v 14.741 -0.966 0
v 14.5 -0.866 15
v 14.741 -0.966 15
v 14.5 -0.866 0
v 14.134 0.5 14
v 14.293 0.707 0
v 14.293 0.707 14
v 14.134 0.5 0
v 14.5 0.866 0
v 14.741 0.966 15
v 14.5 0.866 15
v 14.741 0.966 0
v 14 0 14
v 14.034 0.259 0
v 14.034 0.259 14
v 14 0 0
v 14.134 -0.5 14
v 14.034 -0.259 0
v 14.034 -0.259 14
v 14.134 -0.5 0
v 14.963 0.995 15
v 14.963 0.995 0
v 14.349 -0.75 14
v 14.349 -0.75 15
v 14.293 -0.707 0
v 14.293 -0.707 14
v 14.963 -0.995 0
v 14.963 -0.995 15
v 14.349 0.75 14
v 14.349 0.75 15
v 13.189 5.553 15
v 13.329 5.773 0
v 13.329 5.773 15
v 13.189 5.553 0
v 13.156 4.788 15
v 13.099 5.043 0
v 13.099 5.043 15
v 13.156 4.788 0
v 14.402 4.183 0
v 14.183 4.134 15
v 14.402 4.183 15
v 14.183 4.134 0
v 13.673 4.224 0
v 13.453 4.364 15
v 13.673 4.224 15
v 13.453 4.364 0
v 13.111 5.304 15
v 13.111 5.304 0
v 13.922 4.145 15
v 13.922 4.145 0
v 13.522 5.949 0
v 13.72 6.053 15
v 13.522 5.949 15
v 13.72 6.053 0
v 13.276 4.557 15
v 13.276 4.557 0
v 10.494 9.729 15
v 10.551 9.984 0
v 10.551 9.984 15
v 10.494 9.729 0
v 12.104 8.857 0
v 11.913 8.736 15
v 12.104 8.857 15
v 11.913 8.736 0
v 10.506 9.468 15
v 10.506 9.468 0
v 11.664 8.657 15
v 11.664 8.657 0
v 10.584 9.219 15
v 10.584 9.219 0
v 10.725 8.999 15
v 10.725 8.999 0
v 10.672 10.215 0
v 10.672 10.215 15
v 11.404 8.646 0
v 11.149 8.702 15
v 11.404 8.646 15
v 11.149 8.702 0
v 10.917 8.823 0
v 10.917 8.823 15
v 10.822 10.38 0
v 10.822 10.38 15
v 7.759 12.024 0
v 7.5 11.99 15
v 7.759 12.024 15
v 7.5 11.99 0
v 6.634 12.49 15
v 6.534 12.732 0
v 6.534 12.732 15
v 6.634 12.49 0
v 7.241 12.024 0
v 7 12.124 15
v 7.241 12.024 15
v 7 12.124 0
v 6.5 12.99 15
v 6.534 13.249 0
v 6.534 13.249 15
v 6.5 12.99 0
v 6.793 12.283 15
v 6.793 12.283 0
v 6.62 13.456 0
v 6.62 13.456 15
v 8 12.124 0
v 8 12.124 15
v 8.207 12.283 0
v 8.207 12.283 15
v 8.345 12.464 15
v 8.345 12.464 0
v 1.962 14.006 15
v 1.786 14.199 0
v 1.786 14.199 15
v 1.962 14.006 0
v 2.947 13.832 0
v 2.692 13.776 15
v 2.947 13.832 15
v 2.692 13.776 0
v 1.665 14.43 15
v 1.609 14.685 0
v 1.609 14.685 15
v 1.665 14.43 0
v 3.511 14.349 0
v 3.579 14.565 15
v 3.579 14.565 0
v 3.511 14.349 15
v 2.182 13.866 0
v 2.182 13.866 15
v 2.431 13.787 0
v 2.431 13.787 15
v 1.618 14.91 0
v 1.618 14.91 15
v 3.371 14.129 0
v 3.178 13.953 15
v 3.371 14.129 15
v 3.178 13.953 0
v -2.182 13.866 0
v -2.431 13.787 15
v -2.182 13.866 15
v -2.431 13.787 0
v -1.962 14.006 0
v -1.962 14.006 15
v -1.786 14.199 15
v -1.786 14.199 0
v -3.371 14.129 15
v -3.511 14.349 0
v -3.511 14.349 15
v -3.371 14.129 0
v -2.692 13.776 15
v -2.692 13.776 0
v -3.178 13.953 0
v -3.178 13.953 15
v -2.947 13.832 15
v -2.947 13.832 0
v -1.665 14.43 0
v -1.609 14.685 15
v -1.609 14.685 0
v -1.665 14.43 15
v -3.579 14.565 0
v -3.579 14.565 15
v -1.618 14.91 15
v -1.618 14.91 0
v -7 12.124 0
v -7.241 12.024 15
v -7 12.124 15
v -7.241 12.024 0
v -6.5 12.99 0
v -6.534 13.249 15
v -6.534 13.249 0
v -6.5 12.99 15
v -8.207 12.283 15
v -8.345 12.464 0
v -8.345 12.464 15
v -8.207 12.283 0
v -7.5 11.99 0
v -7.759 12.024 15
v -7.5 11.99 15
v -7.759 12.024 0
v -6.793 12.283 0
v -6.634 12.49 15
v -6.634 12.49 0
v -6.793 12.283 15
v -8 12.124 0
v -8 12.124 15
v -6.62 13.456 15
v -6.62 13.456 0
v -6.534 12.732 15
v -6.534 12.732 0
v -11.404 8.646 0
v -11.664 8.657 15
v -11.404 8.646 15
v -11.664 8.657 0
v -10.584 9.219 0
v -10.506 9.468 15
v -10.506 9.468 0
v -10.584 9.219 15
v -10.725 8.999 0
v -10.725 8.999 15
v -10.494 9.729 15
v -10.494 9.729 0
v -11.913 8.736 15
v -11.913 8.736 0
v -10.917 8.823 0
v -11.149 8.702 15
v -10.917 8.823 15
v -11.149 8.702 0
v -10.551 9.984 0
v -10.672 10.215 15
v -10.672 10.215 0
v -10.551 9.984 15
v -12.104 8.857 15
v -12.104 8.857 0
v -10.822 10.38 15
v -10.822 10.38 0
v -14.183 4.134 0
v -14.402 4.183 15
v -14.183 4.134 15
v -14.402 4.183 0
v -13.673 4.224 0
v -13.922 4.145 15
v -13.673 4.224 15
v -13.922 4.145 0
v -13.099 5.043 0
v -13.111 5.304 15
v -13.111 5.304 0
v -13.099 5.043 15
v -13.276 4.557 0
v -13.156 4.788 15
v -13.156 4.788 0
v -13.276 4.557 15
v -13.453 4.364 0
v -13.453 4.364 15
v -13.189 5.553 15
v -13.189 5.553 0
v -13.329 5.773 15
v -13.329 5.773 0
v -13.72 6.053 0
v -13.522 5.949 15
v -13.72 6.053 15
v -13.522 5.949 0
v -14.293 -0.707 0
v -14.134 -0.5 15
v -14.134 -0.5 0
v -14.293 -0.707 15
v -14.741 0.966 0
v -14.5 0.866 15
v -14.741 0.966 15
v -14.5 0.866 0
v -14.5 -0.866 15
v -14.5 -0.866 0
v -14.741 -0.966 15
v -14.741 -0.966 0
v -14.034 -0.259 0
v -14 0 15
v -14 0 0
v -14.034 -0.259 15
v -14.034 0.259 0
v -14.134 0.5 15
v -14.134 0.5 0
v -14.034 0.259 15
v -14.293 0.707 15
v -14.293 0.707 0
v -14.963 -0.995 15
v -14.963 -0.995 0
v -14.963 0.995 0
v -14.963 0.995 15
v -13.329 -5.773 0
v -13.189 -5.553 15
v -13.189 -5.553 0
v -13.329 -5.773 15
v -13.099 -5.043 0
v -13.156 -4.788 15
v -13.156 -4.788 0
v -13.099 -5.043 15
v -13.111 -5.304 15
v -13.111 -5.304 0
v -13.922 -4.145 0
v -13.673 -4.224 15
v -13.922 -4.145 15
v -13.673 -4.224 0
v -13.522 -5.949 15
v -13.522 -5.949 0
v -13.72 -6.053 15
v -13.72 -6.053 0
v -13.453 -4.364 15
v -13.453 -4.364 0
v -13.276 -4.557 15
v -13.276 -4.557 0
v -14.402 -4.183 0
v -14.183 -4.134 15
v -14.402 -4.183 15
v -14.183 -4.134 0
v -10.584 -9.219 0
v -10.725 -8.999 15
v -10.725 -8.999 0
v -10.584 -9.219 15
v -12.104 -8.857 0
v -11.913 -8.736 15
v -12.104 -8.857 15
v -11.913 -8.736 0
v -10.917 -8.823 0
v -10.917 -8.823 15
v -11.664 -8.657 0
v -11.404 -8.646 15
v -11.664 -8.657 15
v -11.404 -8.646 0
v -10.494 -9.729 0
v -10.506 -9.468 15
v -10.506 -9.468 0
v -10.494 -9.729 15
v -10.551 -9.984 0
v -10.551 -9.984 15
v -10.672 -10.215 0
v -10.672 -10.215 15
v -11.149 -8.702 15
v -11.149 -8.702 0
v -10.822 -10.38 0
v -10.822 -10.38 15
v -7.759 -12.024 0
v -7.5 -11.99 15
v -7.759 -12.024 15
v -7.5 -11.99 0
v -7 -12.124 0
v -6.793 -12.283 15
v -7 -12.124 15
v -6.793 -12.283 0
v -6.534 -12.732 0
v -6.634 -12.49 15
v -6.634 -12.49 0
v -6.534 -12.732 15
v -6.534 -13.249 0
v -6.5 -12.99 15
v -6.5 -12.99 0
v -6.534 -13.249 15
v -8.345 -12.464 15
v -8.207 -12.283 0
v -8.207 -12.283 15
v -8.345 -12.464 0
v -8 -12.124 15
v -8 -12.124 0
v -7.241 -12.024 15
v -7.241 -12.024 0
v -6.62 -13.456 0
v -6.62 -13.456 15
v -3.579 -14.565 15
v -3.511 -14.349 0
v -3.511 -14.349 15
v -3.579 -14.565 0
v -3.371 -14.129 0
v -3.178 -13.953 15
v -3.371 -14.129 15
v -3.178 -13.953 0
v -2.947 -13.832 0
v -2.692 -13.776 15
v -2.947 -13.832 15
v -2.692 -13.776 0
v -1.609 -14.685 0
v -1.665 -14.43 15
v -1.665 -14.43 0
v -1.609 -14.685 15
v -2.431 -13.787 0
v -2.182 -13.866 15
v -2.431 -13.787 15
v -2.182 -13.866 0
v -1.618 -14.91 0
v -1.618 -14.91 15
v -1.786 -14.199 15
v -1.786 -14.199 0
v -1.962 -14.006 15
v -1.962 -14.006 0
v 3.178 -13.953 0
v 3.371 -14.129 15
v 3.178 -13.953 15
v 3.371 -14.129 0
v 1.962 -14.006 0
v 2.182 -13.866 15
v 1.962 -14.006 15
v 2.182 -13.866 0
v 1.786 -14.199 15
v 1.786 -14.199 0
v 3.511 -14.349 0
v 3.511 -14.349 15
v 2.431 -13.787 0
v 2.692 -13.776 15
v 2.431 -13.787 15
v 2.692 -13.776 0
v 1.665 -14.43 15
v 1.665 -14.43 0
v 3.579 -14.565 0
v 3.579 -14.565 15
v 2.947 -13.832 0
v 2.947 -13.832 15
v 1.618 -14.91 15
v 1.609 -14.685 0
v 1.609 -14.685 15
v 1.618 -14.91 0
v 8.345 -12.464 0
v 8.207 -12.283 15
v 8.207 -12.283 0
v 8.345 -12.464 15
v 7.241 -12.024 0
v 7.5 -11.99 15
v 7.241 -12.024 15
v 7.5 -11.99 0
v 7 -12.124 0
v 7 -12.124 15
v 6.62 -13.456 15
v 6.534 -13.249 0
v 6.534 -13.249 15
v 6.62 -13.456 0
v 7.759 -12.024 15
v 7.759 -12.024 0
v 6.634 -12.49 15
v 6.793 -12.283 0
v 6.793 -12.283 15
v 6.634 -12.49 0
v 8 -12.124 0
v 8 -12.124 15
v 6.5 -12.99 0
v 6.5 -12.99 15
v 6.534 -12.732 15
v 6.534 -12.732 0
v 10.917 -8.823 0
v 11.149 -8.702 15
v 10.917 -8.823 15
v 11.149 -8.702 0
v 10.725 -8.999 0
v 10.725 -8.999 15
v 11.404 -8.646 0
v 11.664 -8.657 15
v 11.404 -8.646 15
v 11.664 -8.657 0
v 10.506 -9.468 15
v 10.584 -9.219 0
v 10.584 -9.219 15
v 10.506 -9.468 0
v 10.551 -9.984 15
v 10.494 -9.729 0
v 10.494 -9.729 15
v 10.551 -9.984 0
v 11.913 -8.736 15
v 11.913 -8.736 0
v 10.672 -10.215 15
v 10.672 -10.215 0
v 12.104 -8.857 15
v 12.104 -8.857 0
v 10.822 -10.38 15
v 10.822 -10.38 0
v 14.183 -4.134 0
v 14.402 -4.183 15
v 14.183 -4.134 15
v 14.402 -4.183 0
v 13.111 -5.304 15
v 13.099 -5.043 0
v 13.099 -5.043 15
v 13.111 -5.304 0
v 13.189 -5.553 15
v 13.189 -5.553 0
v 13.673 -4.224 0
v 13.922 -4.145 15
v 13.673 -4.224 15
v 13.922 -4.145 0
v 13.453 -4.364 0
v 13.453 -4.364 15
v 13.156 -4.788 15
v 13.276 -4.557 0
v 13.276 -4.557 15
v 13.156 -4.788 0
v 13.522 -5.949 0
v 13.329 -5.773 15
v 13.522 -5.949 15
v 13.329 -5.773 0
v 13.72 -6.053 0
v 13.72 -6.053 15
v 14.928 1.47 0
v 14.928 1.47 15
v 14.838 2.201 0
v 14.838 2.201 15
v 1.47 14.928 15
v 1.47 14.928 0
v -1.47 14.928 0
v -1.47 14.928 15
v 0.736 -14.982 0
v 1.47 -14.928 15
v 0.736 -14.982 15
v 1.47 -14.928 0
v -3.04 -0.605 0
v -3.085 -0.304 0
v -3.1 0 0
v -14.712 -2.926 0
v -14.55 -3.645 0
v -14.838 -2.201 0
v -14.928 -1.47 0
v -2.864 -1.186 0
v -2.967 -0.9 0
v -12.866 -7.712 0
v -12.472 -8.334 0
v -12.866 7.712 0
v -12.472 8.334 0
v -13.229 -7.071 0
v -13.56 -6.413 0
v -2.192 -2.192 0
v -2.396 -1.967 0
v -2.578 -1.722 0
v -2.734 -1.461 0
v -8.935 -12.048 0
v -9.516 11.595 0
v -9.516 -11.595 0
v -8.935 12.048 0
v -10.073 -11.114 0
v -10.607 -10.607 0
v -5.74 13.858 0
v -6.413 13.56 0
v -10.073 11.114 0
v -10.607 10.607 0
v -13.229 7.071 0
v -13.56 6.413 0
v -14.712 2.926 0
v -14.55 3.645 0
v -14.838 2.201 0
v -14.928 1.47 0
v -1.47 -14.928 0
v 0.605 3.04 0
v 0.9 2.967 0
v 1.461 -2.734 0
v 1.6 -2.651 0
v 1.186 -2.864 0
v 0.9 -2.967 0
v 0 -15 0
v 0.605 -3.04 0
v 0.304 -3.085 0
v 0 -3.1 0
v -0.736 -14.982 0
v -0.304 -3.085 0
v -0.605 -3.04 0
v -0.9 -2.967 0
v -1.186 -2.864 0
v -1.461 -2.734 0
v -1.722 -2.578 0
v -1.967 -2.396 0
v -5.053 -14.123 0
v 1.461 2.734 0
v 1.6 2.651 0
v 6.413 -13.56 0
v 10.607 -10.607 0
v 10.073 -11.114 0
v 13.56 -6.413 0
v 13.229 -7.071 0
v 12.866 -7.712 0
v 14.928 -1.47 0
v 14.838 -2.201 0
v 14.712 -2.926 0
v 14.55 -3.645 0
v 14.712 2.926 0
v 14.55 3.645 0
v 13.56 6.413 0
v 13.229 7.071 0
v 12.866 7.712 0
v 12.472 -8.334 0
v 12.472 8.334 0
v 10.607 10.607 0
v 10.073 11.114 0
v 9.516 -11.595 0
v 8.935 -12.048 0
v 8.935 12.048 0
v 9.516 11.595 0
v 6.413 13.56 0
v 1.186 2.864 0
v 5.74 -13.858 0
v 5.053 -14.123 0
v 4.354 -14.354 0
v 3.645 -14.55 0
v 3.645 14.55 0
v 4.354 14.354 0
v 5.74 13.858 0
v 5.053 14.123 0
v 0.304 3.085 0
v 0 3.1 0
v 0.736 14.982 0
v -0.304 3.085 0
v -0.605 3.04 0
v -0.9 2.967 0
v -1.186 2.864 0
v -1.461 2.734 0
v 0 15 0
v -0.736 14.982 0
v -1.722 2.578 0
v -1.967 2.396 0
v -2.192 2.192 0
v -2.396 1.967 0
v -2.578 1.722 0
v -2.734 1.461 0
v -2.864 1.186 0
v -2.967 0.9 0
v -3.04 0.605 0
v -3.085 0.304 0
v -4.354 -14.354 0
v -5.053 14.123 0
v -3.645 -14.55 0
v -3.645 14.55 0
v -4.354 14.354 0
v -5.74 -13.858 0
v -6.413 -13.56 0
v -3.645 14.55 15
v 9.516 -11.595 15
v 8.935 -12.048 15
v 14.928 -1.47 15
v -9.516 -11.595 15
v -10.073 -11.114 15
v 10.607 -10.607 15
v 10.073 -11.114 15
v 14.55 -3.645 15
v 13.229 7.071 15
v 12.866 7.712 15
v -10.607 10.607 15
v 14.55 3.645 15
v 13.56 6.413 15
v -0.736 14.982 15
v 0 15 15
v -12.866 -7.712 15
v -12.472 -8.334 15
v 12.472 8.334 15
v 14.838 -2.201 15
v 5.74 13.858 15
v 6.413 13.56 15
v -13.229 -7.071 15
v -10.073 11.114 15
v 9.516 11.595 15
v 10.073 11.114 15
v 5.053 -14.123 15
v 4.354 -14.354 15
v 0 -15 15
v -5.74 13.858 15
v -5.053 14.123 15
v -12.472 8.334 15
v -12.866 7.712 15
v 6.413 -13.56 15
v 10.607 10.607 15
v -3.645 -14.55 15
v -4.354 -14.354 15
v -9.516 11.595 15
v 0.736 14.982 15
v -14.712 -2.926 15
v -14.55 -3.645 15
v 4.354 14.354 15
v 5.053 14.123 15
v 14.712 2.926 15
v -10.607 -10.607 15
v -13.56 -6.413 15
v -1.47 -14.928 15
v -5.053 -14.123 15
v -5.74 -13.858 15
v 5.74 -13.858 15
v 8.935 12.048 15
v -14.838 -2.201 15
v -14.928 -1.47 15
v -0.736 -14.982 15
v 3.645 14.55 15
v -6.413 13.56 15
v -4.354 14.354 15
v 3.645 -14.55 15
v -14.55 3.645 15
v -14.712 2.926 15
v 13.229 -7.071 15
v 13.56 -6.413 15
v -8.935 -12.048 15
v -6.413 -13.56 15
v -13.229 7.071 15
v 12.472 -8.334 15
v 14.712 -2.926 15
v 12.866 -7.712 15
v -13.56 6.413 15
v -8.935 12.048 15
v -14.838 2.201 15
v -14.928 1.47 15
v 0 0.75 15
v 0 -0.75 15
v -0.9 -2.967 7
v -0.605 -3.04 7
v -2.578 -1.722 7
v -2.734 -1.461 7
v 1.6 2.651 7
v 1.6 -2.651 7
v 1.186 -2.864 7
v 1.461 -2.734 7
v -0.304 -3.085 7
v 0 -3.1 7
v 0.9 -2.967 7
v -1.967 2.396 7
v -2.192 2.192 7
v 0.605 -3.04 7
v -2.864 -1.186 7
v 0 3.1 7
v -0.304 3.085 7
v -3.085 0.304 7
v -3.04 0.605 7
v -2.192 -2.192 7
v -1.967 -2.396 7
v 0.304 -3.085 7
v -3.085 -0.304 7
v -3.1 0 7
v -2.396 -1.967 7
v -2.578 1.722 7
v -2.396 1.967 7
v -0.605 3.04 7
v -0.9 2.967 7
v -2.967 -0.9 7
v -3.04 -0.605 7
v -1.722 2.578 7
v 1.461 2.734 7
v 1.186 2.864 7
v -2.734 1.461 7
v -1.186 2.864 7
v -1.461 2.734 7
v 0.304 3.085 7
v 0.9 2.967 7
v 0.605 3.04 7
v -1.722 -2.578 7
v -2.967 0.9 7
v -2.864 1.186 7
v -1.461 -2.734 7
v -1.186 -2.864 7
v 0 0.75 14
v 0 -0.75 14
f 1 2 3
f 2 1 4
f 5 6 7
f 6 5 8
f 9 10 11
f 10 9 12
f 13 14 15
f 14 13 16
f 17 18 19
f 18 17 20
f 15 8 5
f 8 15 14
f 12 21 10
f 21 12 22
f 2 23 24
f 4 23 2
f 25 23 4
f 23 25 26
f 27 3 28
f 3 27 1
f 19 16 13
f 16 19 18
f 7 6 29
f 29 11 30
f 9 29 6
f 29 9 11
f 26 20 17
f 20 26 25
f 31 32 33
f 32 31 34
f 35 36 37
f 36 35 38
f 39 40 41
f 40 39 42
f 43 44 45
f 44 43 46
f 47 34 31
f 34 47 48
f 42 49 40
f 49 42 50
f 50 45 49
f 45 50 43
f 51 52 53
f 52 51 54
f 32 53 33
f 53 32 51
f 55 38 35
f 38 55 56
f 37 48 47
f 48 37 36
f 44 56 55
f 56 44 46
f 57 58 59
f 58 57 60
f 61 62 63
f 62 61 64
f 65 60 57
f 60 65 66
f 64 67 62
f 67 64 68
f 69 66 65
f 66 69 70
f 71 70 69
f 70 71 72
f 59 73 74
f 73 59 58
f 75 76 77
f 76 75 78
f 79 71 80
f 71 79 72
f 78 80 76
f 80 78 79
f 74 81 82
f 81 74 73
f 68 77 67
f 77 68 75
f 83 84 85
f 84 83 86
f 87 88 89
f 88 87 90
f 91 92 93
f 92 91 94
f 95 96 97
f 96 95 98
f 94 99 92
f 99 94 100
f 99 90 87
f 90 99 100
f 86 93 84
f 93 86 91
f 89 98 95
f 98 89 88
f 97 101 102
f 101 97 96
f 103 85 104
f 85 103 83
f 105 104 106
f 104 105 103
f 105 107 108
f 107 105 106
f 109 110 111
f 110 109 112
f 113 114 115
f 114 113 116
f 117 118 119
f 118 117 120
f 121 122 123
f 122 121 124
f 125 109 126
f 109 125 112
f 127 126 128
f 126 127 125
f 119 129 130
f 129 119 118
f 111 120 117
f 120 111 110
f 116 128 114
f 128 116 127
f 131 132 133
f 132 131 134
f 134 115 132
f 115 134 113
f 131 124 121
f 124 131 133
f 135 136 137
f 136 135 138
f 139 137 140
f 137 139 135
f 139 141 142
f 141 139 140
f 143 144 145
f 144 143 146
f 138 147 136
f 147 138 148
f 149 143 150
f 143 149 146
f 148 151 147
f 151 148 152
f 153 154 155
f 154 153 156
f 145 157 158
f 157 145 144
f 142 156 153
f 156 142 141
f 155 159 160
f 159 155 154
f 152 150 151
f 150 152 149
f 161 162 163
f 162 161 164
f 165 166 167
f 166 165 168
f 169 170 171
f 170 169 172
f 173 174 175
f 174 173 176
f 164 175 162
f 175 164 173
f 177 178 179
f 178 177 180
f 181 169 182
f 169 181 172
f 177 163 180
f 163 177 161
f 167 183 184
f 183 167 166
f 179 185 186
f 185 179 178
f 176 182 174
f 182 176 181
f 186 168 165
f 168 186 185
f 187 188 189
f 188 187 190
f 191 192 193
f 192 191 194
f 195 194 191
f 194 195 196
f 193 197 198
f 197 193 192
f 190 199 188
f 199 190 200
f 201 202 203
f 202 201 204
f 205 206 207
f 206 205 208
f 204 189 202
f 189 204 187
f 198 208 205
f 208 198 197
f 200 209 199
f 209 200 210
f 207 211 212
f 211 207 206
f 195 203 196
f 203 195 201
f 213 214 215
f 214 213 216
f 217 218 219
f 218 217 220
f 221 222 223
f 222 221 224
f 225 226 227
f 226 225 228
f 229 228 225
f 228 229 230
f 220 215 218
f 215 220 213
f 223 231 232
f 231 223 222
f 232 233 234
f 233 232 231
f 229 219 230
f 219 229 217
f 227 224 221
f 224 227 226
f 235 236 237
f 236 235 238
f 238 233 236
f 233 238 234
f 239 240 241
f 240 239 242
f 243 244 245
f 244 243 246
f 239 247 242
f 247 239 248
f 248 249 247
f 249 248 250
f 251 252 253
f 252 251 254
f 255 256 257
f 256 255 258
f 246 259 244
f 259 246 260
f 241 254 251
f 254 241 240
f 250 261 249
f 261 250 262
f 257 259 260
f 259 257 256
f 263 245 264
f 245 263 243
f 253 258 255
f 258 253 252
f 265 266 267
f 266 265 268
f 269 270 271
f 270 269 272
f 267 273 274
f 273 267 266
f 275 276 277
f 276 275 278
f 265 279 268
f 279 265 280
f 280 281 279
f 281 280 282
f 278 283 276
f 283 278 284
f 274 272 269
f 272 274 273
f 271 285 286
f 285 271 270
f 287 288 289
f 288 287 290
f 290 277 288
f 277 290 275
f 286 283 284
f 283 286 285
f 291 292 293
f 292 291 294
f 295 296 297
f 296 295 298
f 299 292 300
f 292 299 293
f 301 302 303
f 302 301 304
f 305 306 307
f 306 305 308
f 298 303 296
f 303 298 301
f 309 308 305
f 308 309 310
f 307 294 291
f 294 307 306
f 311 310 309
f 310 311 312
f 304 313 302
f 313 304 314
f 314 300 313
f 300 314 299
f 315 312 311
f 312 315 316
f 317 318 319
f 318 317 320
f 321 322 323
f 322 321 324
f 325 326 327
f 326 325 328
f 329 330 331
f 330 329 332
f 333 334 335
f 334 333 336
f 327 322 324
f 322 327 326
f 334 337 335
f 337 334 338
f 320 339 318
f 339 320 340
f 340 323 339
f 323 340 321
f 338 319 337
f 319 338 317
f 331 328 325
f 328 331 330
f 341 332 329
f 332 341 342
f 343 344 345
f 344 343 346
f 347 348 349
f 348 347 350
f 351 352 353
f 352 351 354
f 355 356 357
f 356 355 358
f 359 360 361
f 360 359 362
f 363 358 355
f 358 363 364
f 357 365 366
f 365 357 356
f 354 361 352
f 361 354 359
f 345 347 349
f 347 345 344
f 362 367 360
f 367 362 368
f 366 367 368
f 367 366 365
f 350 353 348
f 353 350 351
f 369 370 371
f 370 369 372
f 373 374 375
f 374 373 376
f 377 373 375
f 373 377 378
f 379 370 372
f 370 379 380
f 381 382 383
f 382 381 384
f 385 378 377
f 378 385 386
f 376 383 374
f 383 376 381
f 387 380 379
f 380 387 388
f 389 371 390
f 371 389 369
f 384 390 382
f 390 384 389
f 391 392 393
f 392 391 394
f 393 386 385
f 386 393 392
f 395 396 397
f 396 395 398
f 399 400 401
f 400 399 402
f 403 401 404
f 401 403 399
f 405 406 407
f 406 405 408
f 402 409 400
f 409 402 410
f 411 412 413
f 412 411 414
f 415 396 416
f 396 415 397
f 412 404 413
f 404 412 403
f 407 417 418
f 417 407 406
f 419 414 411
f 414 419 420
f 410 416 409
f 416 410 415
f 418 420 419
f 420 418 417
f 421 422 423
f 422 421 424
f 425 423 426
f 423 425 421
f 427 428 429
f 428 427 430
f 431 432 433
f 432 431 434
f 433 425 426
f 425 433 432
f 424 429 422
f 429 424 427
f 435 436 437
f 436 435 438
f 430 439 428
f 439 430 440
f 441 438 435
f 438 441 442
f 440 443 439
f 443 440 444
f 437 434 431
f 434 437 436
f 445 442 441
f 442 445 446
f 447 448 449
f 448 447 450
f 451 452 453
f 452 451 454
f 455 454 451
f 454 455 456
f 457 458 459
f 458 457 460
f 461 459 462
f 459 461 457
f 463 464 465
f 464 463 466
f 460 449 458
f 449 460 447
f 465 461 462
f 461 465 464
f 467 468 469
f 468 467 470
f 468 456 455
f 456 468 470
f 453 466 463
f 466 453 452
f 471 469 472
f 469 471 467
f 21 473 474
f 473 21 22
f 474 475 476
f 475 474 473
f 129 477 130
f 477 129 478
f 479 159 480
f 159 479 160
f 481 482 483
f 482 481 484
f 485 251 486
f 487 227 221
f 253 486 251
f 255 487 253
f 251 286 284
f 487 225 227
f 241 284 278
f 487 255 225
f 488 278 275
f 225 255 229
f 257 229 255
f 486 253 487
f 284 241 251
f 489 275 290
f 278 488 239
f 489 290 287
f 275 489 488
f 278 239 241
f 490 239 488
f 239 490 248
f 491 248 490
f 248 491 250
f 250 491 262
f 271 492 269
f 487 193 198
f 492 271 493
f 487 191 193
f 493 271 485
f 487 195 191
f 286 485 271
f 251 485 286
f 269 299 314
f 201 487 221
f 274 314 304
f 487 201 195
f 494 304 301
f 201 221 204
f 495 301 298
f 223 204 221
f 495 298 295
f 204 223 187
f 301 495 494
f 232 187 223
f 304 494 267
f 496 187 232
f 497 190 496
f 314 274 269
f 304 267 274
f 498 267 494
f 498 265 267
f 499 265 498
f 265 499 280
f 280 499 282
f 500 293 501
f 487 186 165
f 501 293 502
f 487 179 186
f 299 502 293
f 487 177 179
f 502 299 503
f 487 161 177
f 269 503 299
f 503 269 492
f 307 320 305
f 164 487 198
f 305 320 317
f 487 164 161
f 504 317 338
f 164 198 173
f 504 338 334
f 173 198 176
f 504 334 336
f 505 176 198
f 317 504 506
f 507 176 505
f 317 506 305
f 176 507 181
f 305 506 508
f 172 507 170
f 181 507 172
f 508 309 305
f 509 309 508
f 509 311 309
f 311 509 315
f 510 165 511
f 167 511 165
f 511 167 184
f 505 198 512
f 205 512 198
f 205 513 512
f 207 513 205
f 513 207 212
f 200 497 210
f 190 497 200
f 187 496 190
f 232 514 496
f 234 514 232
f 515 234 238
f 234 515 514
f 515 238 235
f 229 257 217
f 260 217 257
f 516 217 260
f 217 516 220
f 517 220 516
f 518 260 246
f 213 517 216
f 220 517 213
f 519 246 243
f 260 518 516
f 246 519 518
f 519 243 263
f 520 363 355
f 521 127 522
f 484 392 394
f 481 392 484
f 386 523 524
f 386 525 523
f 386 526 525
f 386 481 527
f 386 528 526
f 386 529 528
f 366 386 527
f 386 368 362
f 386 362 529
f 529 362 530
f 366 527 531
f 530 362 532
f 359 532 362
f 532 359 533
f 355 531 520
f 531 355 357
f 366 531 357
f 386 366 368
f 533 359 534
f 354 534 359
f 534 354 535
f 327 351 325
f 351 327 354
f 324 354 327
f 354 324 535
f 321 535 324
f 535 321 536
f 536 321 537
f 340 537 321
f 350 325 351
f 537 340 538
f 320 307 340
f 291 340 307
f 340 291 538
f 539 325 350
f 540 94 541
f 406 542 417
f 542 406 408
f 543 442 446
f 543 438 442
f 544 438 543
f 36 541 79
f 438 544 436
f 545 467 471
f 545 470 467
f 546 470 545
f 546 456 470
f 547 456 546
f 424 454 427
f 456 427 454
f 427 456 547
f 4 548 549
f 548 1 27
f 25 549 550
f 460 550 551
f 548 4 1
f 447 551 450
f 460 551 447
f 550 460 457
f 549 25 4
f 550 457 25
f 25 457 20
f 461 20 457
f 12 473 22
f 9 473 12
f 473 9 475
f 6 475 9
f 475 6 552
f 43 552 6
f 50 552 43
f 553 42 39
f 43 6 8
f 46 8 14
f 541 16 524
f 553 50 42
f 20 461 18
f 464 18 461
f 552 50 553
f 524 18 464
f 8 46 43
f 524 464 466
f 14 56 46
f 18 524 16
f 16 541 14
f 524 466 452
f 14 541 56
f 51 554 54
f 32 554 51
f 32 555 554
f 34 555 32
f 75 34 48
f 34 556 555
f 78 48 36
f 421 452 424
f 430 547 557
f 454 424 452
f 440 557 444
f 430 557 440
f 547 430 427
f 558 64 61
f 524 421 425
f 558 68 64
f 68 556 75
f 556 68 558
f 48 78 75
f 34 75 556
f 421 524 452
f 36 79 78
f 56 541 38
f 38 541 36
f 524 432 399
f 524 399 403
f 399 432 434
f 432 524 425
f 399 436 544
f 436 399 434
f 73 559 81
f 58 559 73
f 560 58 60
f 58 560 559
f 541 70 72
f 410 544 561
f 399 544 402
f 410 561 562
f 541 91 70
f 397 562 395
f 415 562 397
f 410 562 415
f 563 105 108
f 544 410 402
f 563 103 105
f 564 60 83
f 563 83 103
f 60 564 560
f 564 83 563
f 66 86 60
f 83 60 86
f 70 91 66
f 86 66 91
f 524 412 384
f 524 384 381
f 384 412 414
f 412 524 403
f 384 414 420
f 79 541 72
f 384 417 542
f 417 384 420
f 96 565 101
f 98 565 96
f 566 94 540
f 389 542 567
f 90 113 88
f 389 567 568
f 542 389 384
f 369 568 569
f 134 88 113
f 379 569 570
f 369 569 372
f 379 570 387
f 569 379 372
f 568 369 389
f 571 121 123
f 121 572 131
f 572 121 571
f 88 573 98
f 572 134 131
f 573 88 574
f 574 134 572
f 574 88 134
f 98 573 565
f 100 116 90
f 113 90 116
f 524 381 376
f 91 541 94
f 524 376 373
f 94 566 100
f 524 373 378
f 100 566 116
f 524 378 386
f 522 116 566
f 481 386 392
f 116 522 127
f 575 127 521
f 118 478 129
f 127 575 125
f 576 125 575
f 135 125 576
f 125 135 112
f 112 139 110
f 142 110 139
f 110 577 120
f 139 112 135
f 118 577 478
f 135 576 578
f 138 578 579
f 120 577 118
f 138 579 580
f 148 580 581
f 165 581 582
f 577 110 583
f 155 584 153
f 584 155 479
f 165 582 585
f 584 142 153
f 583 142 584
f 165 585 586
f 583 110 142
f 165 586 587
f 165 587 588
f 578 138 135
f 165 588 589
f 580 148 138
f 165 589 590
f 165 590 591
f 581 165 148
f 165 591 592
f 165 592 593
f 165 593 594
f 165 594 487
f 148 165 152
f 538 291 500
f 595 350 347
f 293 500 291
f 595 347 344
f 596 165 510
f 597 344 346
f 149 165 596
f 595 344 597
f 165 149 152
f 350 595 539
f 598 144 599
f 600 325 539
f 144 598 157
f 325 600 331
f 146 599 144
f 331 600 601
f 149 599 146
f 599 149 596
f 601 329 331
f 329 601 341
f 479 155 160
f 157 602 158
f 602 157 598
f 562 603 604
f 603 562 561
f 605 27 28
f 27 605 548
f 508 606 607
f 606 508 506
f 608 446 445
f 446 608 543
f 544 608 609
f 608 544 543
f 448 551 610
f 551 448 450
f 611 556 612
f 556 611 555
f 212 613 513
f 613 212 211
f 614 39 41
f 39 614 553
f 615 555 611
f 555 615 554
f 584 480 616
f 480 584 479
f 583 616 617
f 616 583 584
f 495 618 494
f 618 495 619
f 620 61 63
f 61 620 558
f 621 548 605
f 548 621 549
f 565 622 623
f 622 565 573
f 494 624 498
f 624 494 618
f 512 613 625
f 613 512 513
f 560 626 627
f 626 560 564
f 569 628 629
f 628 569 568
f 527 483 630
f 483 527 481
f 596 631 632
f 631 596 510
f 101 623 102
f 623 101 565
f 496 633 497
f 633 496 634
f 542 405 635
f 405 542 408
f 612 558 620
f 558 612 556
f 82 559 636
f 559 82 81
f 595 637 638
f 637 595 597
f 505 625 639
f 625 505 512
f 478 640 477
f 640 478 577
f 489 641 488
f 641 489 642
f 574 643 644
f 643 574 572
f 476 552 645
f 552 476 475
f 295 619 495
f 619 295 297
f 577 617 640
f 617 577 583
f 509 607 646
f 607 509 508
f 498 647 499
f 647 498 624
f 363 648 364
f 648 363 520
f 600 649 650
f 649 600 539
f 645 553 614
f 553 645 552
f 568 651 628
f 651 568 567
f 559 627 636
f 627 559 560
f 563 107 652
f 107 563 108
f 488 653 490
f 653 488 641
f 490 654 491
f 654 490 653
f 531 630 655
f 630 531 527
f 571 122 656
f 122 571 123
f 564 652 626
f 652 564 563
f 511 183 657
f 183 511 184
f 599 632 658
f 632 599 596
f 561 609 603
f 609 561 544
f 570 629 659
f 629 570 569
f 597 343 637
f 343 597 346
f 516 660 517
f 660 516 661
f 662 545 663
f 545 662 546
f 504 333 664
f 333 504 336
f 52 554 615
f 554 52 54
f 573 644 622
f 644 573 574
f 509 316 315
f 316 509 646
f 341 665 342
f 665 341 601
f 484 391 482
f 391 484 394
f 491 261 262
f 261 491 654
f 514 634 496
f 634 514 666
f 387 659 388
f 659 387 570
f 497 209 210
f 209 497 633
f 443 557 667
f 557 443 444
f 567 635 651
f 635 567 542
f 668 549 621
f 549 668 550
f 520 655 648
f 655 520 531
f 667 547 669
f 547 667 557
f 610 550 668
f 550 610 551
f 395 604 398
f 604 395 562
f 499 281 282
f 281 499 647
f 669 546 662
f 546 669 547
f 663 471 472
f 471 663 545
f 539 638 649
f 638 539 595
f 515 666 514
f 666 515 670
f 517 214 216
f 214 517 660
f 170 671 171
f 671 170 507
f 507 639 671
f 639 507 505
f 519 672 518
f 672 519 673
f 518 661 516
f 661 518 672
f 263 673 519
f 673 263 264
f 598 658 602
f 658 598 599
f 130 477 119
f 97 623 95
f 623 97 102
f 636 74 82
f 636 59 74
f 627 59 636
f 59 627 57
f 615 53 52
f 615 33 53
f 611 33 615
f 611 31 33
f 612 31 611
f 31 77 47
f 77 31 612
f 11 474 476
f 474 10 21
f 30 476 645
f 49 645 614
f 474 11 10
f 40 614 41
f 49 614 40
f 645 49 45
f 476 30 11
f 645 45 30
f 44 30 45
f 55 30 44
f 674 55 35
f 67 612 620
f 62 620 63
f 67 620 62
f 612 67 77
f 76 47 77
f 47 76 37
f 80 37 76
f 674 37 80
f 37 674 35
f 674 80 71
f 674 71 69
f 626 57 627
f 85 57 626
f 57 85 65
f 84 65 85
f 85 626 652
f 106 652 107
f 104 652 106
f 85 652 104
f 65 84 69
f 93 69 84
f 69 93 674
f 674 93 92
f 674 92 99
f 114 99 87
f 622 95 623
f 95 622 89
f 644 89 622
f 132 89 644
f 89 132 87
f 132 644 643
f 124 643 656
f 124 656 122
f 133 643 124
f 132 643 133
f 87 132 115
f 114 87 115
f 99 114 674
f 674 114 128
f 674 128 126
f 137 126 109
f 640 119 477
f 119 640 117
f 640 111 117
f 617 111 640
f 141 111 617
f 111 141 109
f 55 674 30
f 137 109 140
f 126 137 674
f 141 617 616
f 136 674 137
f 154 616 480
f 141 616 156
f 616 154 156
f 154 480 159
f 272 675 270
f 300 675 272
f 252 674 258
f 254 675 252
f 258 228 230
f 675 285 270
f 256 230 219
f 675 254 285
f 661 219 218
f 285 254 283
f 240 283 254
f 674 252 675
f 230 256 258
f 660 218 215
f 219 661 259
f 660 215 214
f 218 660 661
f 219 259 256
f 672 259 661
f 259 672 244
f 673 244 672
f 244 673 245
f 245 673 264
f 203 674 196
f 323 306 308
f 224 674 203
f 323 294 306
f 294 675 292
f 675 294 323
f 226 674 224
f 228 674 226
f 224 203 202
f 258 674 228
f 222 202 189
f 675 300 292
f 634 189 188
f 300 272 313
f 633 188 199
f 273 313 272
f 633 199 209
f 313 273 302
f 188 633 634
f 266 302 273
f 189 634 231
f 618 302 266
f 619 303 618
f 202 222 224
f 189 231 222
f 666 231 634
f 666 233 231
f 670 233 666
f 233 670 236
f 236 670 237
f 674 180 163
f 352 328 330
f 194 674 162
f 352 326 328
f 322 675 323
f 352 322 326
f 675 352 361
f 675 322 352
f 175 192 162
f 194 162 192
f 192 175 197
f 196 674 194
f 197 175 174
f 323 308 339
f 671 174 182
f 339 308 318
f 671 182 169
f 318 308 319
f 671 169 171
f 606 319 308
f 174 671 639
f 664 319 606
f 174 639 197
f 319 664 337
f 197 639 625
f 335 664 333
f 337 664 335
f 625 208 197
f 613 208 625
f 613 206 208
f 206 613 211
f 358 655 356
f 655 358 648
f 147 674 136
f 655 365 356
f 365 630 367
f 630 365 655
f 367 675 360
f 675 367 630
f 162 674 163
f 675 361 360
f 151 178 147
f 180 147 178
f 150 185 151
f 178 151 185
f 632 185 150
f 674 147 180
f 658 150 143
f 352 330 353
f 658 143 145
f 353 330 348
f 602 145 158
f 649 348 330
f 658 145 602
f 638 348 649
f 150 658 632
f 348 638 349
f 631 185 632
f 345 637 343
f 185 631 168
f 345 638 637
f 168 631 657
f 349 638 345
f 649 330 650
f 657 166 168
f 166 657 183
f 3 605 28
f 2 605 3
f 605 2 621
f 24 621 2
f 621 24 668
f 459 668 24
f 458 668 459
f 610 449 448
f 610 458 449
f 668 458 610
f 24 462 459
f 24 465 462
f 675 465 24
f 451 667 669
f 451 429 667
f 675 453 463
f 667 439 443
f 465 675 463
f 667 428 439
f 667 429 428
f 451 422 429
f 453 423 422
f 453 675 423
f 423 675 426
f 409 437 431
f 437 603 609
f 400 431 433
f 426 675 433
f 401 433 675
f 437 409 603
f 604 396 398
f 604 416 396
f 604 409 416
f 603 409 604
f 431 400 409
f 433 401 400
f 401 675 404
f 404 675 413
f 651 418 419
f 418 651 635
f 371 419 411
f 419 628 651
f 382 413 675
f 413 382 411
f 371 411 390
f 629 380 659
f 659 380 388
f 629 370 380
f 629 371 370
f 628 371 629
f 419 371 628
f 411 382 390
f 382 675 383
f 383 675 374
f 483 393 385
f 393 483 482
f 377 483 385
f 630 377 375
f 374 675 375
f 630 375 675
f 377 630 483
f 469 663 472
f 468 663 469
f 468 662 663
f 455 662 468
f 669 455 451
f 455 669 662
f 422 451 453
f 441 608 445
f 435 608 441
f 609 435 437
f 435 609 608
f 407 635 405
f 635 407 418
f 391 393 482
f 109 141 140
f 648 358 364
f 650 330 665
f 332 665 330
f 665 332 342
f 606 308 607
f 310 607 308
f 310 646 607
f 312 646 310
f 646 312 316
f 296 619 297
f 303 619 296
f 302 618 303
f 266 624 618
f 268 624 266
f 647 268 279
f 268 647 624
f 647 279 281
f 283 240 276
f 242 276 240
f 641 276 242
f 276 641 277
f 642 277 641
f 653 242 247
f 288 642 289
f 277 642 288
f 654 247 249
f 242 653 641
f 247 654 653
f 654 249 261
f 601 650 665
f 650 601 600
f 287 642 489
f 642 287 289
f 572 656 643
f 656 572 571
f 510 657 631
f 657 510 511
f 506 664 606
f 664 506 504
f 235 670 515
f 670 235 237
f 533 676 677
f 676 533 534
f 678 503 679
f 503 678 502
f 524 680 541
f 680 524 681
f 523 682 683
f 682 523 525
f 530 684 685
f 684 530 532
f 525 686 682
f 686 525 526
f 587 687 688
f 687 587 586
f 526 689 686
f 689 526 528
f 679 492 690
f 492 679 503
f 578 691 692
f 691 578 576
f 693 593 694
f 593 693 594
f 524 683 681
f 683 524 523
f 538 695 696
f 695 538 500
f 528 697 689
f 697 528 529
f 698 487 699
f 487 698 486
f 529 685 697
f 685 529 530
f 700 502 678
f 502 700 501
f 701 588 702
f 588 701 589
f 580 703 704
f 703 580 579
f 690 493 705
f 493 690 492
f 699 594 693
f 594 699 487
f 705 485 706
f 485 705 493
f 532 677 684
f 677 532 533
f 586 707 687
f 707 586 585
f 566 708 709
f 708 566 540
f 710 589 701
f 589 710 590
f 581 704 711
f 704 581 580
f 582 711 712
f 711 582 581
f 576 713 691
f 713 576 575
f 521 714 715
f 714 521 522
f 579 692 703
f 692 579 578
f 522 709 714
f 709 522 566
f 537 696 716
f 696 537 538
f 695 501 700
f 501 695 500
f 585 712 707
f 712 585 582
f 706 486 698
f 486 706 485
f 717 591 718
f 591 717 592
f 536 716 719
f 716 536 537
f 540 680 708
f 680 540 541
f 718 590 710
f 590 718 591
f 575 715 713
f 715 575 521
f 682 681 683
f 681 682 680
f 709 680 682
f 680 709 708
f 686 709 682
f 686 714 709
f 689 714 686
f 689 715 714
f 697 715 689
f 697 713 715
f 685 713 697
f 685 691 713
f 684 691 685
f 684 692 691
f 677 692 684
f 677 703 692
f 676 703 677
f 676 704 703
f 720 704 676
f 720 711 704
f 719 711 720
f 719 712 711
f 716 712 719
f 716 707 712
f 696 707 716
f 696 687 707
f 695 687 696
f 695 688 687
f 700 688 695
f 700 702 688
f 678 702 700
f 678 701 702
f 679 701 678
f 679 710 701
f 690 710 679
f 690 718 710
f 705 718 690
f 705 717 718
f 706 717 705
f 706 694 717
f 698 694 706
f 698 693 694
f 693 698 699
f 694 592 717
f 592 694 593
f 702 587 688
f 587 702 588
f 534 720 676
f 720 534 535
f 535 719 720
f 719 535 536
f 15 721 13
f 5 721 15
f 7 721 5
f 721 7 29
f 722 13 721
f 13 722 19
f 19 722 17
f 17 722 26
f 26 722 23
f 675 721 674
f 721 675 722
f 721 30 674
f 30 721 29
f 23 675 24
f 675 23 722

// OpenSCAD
// D-shaft knob with a 7 mm bore instead of 12 mm

/* [Knob] */
knob_d = 30;
knob_h = 15;
shaft_d = 6.2;         // 6 mm shaft + 0.2 mm clearance
shaft_flat = 4.7;      // flat-to-round distance (4.5 mm nominal + clearance)
bore_depth = 7;
n_grooves = 18;
groove_d = 2;
pointer_w = 1.5;
pointer_depth = 1;

/* [Hidden] */
eps = 0.01;

difference() {
    cylinder(d = knob_d, h = knob_h, $fn = 128);
    // D-shaped bore; the flat faces +X
    translate([0, 0, -eps])
        linear_extrude(bore_depth + eps)
            intersection() {
                circle(d = shaft_d, $fn = 64);
                translate([-shaft_d / 2, -shaft_d / 2]) square([shaft_flat, shaft_d]);
            }
    // grip grooves
    for (i = [0 : n_grooves - 1])
        rotate(i * 360 / n_grooves)
            translate([knob_d / 2, 0, -eps]) cylinder(d = groove_d, h = knob_h + 2 * eps, $fn = 24);
    // pointer groove on top, pointing at the flat (+X)
    translate([0, -pointer_w / 2, knob_h - pointer_depth])
        cube([knob_d / 2 + 1, pointer_w, pointer_depth + eps]);
}
